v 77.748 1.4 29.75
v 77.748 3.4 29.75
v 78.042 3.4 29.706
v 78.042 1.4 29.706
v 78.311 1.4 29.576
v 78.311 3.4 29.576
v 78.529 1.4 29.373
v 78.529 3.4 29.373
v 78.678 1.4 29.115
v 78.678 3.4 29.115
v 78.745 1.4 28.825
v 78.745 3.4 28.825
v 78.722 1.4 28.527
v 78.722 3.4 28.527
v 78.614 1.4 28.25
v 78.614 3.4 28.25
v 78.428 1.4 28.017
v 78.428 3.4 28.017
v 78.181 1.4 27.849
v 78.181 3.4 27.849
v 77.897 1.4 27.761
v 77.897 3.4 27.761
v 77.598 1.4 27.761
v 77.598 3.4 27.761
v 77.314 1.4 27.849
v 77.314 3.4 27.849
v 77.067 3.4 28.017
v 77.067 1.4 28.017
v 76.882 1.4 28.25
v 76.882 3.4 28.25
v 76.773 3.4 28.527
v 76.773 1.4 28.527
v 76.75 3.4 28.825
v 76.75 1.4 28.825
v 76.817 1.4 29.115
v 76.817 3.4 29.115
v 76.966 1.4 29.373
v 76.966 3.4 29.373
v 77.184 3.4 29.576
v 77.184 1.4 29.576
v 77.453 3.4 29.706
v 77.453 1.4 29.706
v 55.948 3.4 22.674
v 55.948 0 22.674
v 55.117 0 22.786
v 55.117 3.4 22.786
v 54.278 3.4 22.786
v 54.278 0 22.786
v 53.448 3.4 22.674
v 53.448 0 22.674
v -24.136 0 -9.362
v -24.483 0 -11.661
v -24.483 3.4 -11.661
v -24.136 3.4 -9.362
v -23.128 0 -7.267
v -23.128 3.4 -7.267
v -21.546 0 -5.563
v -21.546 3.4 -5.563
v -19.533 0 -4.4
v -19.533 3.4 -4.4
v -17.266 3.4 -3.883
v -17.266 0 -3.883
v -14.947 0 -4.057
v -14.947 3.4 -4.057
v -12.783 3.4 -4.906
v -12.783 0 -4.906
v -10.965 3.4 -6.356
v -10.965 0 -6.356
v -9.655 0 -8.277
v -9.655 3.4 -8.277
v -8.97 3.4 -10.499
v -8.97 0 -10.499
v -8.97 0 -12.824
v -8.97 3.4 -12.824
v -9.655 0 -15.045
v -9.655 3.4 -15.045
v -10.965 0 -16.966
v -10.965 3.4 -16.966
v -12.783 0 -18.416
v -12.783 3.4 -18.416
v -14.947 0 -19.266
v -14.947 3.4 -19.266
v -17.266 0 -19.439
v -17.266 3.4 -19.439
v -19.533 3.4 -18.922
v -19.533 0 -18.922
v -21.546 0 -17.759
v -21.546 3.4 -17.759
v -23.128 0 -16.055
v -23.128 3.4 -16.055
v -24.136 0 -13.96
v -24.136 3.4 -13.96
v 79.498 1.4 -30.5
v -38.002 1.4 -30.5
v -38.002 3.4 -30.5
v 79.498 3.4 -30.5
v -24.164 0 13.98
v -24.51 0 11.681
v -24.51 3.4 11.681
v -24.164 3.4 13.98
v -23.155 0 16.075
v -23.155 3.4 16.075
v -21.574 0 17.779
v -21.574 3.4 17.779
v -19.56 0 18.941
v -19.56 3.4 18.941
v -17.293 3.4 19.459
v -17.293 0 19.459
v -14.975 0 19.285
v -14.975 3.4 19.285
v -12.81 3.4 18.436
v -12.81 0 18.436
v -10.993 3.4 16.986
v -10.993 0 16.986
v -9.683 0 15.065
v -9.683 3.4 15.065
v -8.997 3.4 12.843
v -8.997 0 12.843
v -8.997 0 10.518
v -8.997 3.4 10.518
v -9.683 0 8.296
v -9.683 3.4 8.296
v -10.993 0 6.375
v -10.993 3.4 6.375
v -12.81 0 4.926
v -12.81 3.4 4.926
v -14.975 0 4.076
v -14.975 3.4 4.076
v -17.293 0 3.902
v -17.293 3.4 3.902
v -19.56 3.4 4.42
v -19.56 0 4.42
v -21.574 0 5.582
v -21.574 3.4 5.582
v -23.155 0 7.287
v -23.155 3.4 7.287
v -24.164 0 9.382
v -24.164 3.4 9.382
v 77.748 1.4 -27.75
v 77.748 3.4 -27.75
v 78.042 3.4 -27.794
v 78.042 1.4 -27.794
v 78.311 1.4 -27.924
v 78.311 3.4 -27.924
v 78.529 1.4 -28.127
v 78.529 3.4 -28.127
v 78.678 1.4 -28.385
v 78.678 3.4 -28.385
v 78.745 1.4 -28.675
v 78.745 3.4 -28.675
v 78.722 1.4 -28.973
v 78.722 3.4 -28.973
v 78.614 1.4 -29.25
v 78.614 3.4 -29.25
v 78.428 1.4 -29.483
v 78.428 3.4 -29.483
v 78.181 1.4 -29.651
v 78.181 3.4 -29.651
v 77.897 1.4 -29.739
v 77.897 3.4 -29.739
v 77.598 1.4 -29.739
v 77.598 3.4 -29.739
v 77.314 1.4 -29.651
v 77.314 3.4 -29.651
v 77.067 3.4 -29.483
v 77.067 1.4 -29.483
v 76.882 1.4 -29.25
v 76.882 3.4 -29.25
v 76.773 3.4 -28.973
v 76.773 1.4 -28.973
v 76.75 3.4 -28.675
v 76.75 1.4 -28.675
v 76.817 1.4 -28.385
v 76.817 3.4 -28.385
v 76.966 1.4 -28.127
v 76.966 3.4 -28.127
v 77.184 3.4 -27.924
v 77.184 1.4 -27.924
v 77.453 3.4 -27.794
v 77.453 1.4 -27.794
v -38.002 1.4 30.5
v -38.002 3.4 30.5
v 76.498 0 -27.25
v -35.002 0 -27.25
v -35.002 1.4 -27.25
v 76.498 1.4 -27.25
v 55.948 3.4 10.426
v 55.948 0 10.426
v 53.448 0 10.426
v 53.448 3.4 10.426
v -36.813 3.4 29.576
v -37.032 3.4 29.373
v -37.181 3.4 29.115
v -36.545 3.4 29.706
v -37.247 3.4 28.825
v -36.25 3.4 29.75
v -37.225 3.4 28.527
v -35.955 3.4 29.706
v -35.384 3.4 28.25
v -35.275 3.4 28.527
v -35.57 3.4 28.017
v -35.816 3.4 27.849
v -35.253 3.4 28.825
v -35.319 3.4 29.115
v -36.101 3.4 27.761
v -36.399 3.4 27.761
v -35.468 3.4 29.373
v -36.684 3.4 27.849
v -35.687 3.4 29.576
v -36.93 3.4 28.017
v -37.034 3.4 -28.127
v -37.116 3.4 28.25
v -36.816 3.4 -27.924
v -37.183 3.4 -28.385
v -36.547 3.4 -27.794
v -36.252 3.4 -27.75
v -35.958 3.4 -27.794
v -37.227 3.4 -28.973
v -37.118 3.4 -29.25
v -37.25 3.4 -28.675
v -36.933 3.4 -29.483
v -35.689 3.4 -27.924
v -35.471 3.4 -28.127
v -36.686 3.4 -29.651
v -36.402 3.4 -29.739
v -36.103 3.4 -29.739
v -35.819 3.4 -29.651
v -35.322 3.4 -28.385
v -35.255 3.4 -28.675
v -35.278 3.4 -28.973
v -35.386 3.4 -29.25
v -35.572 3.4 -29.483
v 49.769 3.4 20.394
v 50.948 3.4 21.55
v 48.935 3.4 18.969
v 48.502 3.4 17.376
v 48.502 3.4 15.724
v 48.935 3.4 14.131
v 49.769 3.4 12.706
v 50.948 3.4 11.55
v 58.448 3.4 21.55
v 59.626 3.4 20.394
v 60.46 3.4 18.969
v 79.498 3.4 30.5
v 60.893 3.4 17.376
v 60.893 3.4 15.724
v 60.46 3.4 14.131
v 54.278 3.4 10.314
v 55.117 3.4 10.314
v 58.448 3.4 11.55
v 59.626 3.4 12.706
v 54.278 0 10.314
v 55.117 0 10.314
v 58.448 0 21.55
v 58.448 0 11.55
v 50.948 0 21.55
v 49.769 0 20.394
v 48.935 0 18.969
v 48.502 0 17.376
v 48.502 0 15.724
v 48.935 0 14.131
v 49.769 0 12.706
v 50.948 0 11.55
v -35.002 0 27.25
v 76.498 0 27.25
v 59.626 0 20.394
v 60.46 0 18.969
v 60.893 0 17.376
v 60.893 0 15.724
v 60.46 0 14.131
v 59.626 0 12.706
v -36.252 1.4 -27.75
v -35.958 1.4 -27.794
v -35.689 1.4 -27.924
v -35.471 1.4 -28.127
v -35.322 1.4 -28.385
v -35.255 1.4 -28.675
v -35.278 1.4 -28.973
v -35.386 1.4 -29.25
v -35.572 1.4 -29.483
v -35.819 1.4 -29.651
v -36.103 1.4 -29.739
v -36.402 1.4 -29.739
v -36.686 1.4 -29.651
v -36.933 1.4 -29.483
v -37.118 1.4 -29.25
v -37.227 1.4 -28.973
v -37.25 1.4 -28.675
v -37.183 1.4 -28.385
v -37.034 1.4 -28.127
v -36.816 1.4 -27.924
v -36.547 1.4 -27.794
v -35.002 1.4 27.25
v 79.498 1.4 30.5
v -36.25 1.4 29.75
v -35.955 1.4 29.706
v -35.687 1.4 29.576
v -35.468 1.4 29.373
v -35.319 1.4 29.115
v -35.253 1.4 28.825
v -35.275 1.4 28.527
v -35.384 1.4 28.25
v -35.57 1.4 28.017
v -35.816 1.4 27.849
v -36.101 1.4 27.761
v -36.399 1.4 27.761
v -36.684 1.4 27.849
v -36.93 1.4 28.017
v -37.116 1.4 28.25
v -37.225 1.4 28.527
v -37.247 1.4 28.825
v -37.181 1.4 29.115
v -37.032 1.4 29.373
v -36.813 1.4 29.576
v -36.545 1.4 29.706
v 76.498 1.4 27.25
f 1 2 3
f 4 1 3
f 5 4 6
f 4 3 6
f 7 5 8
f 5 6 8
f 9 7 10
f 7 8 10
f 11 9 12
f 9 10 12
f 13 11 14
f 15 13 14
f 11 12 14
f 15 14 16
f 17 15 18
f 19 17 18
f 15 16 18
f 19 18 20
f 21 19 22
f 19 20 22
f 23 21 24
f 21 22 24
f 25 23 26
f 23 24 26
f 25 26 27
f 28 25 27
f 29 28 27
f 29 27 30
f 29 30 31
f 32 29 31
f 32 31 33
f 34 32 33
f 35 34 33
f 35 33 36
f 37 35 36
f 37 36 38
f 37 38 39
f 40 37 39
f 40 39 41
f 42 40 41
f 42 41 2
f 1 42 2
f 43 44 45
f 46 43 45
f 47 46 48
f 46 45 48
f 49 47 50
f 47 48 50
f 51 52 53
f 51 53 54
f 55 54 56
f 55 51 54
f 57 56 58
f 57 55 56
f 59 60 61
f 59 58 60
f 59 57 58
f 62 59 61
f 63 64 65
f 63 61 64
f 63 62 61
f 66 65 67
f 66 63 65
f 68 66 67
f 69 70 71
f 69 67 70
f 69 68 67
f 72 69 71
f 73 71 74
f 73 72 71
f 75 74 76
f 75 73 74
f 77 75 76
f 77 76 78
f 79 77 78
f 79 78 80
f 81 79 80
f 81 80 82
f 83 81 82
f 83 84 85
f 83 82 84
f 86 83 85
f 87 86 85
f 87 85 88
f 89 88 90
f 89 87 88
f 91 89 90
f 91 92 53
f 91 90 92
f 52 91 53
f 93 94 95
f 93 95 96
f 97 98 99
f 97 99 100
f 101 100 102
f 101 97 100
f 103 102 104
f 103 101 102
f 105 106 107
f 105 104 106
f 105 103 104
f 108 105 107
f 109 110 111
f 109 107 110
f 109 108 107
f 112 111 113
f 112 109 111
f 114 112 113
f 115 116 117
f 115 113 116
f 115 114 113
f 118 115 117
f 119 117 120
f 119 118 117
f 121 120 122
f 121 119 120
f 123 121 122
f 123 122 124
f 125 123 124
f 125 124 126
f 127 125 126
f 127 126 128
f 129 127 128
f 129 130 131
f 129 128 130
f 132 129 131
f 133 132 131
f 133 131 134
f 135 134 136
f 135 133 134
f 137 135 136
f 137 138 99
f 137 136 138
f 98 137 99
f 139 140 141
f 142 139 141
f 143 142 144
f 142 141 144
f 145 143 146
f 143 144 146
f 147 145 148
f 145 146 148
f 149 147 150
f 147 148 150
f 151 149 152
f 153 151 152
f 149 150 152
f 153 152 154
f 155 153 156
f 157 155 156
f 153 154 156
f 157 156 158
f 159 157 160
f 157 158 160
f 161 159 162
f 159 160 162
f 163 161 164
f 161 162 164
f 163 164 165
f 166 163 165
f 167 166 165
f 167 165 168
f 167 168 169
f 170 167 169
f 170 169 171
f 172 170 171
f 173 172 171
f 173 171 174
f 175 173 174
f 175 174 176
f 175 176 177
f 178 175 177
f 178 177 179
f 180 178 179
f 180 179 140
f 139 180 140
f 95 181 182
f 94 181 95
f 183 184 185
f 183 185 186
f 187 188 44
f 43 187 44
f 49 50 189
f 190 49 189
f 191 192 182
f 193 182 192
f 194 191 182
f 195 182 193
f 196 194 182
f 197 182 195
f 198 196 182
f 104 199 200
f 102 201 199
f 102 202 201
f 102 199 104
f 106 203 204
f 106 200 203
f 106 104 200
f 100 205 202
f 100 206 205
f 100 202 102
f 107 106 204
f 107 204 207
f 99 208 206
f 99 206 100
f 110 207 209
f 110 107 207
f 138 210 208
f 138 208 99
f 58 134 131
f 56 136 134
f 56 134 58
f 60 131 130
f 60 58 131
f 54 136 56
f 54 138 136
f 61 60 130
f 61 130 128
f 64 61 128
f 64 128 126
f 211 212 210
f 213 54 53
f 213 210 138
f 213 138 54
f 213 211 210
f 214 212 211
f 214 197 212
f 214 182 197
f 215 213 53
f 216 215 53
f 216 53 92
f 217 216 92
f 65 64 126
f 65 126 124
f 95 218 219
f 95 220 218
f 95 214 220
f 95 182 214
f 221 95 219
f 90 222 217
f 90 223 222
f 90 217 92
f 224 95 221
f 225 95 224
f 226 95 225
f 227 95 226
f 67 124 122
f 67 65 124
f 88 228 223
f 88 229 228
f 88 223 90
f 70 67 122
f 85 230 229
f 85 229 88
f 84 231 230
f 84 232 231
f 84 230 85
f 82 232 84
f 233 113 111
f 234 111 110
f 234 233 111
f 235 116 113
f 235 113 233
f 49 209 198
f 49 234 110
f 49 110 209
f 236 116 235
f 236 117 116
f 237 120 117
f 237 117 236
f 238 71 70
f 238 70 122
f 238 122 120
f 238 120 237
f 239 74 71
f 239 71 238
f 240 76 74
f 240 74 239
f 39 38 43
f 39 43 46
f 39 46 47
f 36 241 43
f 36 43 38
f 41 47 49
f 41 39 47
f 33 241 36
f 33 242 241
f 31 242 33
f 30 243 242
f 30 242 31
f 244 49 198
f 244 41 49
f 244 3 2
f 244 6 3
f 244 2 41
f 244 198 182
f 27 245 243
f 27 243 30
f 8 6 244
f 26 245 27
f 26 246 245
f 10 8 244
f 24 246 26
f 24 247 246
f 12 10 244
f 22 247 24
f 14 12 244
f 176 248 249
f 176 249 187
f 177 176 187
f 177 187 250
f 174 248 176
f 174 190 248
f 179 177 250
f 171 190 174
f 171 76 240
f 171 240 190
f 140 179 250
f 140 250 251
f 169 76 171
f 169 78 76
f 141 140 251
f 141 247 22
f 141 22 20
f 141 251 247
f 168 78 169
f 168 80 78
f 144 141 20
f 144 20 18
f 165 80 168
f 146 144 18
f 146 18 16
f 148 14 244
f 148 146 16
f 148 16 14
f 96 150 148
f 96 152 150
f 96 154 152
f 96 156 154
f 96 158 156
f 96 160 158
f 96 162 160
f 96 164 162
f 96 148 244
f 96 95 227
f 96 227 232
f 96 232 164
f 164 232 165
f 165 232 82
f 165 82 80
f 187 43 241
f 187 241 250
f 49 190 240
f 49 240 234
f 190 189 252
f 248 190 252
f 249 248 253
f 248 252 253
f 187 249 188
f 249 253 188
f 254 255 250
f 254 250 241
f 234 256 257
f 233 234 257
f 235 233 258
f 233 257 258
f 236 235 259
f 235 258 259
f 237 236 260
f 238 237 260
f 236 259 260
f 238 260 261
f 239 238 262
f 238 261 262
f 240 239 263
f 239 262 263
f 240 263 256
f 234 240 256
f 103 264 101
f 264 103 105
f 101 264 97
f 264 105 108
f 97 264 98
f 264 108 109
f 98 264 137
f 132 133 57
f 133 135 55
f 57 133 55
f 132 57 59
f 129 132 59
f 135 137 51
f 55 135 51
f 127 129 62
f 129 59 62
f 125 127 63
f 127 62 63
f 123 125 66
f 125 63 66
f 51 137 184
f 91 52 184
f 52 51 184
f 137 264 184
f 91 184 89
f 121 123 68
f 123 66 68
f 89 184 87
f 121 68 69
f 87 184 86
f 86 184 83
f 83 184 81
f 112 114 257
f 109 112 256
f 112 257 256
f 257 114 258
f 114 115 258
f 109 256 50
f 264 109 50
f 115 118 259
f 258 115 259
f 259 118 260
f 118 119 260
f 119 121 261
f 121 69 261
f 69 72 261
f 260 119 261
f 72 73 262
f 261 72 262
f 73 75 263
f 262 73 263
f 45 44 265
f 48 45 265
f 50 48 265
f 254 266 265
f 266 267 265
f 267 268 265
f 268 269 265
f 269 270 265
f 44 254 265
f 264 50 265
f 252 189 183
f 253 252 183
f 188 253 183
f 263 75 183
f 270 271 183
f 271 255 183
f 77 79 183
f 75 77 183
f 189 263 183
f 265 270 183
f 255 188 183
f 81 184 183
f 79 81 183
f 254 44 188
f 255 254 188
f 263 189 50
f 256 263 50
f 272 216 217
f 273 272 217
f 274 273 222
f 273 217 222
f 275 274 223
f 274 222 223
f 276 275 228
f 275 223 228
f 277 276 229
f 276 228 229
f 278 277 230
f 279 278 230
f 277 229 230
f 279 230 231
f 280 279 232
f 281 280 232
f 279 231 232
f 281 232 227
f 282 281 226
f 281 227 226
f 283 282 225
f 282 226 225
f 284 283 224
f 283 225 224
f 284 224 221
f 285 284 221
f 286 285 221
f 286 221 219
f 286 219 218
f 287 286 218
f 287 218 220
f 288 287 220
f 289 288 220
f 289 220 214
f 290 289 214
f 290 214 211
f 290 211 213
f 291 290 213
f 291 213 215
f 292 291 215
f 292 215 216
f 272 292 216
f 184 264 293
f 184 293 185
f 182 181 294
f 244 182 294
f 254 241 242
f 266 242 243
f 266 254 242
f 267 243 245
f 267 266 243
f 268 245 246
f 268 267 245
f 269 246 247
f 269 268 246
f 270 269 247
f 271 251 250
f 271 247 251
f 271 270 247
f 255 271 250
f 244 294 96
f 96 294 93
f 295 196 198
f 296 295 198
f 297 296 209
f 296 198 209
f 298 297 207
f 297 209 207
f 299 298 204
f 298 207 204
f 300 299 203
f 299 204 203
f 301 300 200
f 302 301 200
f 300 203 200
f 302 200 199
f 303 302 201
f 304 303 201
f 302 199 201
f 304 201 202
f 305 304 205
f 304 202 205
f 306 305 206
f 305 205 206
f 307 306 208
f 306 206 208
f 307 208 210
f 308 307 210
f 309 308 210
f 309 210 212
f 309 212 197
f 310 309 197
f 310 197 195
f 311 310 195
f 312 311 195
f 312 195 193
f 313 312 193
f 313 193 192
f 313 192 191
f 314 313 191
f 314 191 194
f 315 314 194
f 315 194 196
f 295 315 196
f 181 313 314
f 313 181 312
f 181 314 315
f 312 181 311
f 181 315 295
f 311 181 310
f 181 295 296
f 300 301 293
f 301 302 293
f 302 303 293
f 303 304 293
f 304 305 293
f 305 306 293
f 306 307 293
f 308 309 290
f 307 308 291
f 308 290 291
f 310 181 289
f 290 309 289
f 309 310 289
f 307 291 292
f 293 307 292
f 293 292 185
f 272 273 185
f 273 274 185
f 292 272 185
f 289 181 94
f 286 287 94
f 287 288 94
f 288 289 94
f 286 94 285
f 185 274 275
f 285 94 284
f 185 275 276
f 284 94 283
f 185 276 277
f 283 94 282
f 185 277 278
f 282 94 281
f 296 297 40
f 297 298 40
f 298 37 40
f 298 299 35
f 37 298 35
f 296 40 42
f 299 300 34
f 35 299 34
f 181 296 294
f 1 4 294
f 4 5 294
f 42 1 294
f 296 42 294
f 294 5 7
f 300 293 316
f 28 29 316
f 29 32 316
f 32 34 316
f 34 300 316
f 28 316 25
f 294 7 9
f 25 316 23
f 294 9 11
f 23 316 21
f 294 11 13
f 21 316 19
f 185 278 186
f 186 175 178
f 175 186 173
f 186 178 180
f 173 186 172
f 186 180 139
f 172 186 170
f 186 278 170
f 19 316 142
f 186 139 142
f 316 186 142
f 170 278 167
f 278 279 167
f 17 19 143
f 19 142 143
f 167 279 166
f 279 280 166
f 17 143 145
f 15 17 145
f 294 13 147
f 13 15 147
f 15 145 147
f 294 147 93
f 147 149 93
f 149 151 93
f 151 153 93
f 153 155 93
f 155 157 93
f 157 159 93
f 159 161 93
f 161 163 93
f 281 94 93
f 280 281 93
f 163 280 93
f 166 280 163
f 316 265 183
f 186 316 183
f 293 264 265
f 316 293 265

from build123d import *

# Parameters (mm, degrees)
ESBO_O18_W                 = 111.5
ESBO_O18_H                 = 54.5
RESSALTO_EXTRUS_O2_DEPTH   = 1.4
ESBO_O19_W                 = 117.5
ESBO_O19_H                 = 61
RESSALTO_EXTRUS_O3_DEPTH   = 2
ESBO_O24_R                 = 1
CORTE_EXTRUS_O1_DEPTH      = 86.215413827
CORTE_EXTRUS_O3_DEPTH      = 86.460885308
CORTE_EXTRUS_O3_DEPTH_BACK = 86.460885308
ESBO_O25_R                 = 7.8
ESBO_O25_R_2               = 4.186600547
CORTE_EXTRUS_O8_DEPTH      = 86.215413827


with BuildPart() as part:
    # Esboço18 → Ressalto-extrusão2 (new body)
    with BuildSketch(Plane(origin=(0, 0, 0), x_dir=(1, 0, 0), z_dir=(0, 1, 0))):
        with Locations((20.747526714, 0)):
            Rectangle(ESBO_O18_W, ESBO_O18_H)
    extrude(amount=RESSALTO_EXTRUS_O2_DEPTH)

    # Esboço19 → Ressalto-extrusão3 (add)
    with BuildSketch(Plane(origin=(0, 1.4, 0), x_dir=(1, 0, 0), z_dir=(0, 1, 0))):
        with Locations((20.747526714, 0)):
            Rectangle(ESBO_O19_W, ESBO_O19_H)
    extrude(amount=RESSALTO_EXTRUS_O3_DEPTH)

    # Esboço24 → Corte-extrusão1 (cut, through all)
    with BuildSketch(Plane(origin=(0, 3.4, 0), x_dir=(1, 0, 0), z_dir=(0, 1, 0))):
        with Locations(Location((-36.252473286, 28.75, 0), (0, 0, 270))):
            Circle(ESBO_O24_R)
        with Locations(Location((77.747526714, 28.75, 0), (0, 0, 270))):
            Circle(ESBO_O24_R)
        with Locations(Location((77.747526714, -28.75, 0), (0, 0, 270))):
            Circle(ESBO_O24_R)
        with Locations(Location((-36.25, -28.75, 0), (0, 0, 270))):
            Circle(ESBO_O24_R)
    extrude(amount=-CORTE_EXTRUS_O1_DEPTH, mode=Mode.SUBTRACT)

    # Esboço25 → Corte-extrusão3 (cut, two sides: drawn at the far end of the back side and taken through both)
    # profile 1 of 3: a face of its own
    with BuildSketch(Plane(origin=(0, 7.31137223, 0), x_dir=(1, 0, 0), z_dir=(0, 1, 0)).offset(-CORTE_EXTRUS_O3_DEPTH_BACK)):
        with Locations(Location((-16.682939742, 11.661108672, 0), (0, 0, 180))):
            Circle(ESBO_O25_R)
        with Locations((-16.682939742, 11.661108672)):
            Circle(ESBO_O25_R_2, mode=Mode.SUBTRACT)
    # profile 2 of 3: a face of its own
    with BuildSketch(Plane(origin=(0, 7.31137223, 0), x_dir=(1, 0, 0), z_dir=(0, 1, 0)).offset(-CORTE_EXTRUS_O3_DEPTH_BACK)):
        with Locations((-16.682939742, 11.661108672)):
            Circle(ESBO_O25_R_2)
    # profile 3 of 3: a face of its own
    with BuildSketch(Plane(origin=(0, 7.31137223, 0), x_dir=(1, 0, 0), z_dir=(0, 1, 0)).offset(-CORTE_EXTRUS_O3_DEPTH_BACK)):
        with Locations(Location((-16.710330787, -11.680669769, 0), (0, 0, 180))):
            Circle(ESBO_O25_R)
    extrude(amount=CORTE_EXTRUS_O3_DEPTH + CORTE_EXTRUS_O3_DEPTH_BACK, mode=Mode.SUBTRACT)

    # Esboço26 → Corte-extrusão8 (cut, through all)
    with BuildSketch(Plane(origin=(0, 0, 0), x_dir=(1, 0, 0), z_dir=(0, 1, 0))):
        with BuildLine():
            Line((58.447526714, -11.55), (58.447526714, -21.55))
            ThreePointArc((58.447526714, -21.55), (60.947526714, -16.55), (58.447526714, -11.55))
        make_face()
        with BuildLine():
            Line((55.947526714, -10.426275643), (55.947526714, -22.673724357))
            ThreePointArc((55.947526714, -22.673724357), (54.697526714, -22.8), (53.447526714, -22.673724357))
            Line((53.447526714, -22.673724357), (53.447526714, -10.426275643))
            ThreePointArc((53.447526714, -10.426275643), (54.697526714, -10.3), (55.947526714, -10.426275643))
        make_face()
        with BuildLine():
            Line((50.947526714, -11.55), (50.947526714, -21.55))
            ThreePointArc((50.947526714, -21.55), (48.447526714, -16.55), (50.947526714, -11.55))
        make_face()
    extrude(amount=CORTE_EXTRUS_O8_DEPTH, mode=Mode.SUBTRACT)


solid = part.part
